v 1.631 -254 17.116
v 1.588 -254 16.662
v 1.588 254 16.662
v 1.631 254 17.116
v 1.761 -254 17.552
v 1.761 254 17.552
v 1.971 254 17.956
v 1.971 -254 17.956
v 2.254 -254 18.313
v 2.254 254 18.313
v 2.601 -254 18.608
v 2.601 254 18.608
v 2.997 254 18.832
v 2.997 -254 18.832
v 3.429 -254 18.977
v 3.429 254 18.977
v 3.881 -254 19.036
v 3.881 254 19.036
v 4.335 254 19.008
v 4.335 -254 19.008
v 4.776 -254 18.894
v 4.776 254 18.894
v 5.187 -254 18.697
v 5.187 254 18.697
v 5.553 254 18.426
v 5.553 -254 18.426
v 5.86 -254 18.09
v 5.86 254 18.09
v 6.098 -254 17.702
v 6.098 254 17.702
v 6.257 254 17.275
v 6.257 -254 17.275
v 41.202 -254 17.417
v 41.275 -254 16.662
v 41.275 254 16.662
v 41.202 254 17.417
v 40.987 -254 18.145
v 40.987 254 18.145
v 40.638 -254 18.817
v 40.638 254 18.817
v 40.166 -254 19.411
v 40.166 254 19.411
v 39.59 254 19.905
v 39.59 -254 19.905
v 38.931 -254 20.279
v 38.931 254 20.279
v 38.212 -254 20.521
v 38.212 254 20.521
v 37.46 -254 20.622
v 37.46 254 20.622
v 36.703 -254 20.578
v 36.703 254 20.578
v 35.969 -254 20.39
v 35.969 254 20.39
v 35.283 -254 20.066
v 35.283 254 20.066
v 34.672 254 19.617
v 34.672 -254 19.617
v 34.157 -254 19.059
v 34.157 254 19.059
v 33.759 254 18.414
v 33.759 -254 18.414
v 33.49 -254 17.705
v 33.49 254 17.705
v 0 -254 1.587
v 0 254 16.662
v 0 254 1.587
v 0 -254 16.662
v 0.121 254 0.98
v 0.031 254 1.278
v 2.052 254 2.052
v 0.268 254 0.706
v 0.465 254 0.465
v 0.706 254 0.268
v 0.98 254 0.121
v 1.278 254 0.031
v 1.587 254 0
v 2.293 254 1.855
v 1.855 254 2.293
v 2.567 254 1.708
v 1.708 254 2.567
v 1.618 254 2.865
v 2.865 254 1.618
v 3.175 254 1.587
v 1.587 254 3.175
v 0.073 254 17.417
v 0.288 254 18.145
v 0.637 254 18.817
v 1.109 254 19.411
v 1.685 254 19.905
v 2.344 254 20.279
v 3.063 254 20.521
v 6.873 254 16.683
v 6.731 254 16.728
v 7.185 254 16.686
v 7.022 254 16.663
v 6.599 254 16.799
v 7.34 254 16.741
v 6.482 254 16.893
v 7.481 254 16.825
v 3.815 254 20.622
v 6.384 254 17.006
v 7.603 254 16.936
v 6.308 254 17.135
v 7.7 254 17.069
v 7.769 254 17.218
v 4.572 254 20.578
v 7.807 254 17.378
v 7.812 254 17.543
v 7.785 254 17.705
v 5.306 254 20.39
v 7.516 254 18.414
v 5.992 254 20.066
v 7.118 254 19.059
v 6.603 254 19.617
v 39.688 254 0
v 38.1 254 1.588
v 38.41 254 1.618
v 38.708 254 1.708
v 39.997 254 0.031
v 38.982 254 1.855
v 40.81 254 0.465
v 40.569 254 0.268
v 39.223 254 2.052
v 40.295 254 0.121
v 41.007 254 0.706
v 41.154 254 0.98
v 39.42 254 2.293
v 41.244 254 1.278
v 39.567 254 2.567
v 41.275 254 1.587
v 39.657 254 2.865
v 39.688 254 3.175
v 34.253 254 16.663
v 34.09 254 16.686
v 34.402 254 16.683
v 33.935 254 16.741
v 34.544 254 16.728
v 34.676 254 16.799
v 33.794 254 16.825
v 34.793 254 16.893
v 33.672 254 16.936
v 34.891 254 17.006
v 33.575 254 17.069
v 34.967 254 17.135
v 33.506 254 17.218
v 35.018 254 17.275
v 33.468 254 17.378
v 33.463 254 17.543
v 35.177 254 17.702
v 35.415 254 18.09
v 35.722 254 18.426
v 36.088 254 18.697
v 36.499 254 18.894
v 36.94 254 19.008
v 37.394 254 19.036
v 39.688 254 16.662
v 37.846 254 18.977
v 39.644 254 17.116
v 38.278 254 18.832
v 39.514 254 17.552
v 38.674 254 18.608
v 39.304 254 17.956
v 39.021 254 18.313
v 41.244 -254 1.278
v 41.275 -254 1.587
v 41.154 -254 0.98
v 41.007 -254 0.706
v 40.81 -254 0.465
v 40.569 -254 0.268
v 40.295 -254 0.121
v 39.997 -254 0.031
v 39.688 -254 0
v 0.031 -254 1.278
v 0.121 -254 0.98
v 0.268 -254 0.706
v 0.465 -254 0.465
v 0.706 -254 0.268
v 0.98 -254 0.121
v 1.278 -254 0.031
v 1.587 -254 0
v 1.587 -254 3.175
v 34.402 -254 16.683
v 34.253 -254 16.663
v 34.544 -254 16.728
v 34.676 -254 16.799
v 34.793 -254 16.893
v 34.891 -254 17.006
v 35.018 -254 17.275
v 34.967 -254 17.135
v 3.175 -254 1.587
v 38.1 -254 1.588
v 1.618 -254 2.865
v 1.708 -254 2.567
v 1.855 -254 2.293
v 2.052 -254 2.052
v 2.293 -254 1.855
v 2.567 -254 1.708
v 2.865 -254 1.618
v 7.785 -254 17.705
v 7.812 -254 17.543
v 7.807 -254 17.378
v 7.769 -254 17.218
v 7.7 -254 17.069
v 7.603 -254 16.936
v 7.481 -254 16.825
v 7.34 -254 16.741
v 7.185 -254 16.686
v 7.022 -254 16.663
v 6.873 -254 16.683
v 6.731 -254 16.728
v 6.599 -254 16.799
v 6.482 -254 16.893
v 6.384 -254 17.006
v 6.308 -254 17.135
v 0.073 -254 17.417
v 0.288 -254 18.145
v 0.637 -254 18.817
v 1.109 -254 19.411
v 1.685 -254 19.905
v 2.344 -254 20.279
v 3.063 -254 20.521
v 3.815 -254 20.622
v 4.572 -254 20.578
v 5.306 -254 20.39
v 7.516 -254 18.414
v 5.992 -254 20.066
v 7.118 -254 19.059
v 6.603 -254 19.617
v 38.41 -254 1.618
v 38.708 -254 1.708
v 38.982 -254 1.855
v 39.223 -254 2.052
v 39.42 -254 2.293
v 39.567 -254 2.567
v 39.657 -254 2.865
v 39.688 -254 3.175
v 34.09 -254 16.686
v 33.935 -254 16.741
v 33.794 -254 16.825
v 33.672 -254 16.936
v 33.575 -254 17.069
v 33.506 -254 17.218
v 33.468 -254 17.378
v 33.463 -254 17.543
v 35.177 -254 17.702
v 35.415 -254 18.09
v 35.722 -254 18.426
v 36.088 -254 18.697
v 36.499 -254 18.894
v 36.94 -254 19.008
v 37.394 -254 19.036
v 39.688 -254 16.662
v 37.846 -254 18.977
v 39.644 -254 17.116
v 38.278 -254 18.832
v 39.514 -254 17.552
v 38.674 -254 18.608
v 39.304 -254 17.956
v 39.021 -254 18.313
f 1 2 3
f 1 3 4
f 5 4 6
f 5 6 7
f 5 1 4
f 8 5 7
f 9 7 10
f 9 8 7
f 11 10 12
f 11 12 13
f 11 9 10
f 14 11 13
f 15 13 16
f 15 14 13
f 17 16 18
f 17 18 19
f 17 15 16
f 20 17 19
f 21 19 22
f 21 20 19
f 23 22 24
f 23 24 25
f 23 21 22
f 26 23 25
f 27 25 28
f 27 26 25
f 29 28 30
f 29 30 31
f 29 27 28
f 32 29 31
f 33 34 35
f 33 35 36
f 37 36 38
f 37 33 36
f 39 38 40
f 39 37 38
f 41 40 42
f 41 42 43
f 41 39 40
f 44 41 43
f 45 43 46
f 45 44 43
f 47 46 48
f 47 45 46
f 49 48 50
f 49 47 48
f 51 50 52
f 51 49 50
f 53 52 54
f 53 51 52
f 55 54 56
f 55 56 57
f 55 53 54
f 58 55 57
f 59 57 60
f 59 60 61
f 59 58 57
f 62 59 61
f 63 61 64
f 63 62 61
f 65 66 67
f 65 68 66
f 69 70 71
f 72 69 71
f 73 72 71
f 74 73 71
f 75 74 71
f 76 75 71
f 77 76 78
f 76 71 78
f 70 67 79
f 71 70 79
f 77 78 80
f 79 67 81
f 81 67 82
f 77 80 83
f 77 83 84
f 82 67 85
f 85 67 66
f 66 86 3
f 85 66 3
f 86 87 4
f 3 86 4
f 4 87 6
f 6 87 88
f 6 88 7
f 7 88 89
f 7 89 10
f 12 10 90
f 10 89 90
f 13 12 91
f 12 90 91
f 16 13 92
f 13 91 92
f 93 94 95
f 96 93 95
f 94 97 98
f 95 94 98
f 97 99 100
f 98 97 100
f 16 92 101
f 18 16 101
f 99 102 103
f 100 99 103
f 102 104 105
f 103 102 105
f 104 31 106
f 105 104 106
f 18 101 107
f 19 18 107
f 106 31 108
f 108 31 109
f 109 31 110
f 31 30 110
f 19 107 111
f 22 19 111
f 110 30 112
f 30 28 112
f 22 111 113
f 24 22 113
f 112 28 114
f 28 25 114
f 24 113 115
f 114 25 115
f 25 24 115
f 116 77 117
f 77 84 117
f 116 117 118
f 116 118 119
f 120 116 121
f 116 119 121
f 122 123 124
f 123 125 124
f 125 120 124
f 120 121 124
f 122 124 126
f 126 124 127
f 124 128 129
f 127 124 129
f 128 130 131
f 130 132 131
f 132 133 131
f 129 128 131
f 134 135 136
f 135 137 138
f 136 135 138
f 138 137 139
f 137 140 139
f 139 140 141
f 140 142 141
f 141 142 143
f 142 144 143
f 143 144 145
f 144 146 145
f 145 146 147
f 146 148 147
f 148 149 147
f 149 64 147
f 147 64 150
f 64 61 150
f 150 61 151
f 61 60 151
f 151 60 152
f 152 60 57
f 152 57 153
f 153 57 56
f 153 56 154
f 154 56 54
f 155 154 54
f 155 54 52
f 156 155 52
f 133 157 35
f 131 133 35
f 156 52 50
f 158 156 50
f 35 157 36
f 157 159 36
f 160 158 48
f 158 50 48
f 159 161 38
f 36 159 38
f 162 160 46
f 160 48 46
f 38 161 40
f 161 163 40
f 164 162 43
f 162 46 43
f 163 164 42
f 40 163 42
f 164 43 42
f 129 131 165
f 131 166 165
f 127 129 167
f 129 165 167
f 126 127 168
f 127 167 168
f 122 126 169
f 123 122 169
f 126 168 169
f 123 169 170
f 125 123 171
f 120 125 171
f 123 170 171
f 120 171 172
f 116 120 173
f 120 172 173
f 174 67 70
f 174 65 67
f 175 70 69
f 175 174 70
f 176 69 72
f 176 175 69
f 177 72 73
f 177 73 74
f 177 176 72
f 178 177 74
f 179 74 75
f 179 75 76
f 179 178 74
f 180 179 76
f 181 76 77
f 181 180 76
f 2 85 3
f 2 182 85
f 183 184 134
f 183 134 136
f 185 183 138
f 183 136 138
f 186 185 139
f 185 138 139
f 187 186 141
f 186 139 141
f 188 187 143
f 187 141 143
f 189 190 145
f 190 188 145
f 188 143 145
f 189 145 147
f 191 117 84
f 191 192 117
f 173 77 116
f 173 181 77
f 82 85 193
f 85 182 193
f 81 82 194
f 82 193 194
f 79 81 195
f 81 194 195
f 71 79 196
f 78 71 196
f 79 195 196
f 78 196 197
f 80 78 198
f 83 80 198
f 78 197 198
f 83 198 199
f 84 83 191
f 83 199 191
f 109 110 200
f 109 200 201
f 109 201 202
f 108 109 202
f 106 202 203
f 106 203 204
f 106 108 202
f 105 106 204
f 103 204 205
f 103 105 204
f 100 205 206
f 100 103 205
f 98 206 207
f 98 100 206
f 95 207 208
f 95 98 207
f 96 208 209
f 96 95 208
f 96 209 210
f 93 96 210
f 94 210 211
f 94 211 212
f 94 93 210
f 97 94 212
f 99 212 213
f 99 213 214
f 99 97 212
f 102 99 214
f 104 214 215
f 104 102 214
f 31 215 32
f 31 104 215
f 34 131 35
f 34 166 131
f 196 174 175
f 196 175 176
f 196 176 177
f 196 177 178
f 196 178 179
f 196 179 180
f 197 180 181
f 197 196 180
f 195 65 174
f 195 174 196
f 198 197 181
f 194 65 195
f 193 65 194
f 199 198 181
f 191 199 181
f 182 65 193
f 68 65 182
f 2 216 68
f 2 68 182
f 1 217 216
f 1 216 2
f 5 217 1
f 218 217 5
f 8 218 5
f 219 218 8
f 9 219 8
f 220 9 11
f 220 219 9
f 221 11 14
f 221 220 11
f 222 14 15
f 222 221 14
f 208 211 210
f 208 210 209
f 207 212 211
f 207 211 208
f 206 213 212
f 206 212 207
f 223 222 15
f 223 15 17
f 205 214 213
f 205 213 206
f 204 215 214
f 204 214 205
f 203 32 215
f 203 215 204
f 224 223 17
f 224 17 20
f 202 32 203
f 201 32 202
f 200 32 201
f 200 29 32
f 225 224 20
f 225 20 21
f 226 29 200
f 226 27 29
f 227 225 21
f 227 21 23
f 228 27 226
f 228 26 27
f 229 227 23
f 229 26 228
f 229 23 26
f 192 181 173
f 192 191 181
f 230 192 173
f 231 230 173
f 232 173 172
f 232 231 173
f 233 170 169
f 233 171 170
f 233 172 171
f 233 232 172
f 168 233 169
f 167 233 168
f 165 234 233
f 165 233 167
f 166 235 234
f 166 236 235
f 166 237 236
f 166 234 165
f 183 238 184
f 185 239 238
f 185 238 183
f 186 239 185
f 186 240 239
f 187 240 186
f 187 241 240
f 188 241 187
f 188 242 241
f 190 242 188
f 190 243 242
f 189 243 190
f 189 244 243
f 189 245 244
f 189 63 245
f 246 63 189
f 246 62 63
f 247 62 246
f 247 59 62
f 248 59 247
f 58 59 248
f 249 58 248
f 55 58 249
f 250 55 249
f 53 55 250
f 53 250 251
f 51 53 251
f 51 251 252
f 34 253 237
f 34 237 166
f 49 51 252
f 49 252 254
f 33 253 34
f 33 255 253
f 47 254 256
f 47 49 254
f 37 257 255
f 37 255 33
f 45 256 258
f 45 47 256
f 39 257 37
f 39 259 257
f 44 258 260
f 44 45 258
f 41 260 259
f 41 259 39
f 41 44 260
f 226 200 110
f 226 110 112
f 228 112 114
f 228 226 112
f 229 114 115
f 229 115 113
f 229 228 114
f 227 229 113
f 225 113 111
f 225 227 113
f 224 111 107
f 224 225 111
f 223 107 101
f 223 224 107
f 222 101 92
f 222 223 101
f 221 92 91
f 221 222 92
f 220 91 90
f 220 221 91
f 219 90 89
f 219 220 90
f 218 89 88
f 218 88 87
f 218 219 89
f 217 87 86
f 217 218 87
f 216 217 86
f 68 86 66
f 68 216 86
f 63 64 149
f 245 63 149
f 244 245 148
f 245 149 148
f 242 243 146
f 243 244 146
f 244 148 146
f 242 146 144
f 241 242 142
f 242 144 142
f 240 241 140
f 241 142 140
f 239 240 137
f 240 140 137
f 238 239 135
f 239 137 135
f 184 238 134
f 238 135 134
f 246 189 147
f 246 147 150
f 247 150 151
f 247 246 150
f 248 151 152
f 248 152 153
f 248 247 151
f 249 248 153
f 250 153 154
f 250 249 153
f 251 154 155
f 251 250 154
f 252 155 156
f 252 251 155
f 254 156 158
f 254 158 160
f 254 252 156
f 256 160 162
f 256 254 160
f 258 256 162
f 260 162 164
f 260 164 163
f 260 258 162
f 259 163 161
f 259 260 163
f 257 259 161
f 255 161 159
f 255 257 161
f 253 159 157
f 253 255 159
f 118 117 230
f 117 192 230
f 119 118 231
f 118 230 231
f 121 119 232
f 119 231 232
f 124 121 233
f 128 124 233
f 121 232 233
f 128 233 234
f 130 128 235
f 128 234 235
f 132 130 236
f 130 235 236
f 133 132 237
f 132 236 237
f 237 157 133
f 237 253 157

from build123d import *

# Parameters (mm, degrees)
F1_DEPTH    = 254
F2_R        = 1.5875
F3_T1_DEPTH = 511.5860222341
F3_T3_DEPTH = 513.2602424874


# Not quite as in the source:
# - a fillet or chamfer that OpenCascade refuses, or shapes differently, is made with other operations: its cross-section is extruded or revolved along the edge and cut away or added


with BuildPart() as f1:
    # F0 (on Front) → F1 (new body, symmetric)
    with BuildSketch(Plane.XZ):
        with BuildLine():
            Line((0, 16.6624), (0, 0))
            Line((0, 0), (41.275, 0))
            Line((41.275, 0), (41.275, 16.6624))
            ThreePointArc((41.275, 16.6624), (37.3126, 20.6248), (33.3502, 16.6624))
            Line((33.3502, 16.6624), (34.9377, 16.6624))
            ThreePointArc((34.9377, 16.6624), (37.3126, 19.0373), (39.6875, 16.6624))
            Line((39.6875, 16.6624), (39.6875, 1.5875))
            Line((39.6875, 1.5875), (1.5875, 1.5875))
            Line((1.5875, 1.5875), (1.5875, 16.6624))
            Line((1.5875, 16.6624), (0, 16.6624))
        make_face()
        with BuildLine():
            ThreePointArc((7.9248, 16.6624), (3.9624, 20.6248), (0, 16.6624))
            Line((0, 16.6624), (1.5875, 16.6624))
            ThreePointArc((1.5875, 16.6624), (3.9624, 19.0373), (6.3373, 16.6624))
            Line((6.3373, 16.6624), (7.9248, 16.6624))
        make_face()
    extrude(amount=F1_DEPTH, both=True)

    # F2
    f2_edges = [f1.edges().sort_by_distance(p)[0] for p in [
        (0, 0, 0),
        (41.275, 0, 0),
        (39.6875, 0, 1.5875),
        (1.5875, 0, 1.5875),
    ]]
    fillet(f2_edges, radius=F2_R)

    # F3: fillet of radius 0.8255 on 4 edges, made by hand

    # F3_s2 → F3_t1 (cut)
    with BuildSketch(Plane.XZ.offset(-255.793011117)):
        with BuildLine():
            ThreePointArc((34.2204955532, 16.6624), (34.723327211, 16.8332164322), (35.0180621764, 17.2749734127))
            ThreePointArc((35.0180621764, 17.2749734127), (34.957876249, 16.9713110978), (34.9377, 16.6624))
            Line((34.9377, 16.6624), (34.2204955532, 16.6624))
        make_face()
        with BuildLine():
            ThreePointArc((7.0545044468, 16.6624), (6.551672789, 16.8332164322), (6.2569378236, 17.2749734127))
            ThreePointArc((6.2569378236, 17.2749734127), (6.317123751, 16.9713110978), (6.3373, 16.6624))
            Line((6.3373, 16.6624), (7.0545044468, 16.6624))
        make_face()
    extrude(amount=F3_T1_DEPTH, mode=Mode.SUBTRACT)

    # F3_s4 → F3_t3 (cut)
    with BuildSketch(Plane.XZ.offset(-256.6301212437)):
        with BuildLine():
            ThreePointArc((33.4898635929, 17.7051368421), (33.6302261346, 16.9868405041), (34.2862670111, 16.6624))
            Line((34.2862670111, 16.6624), (33.3502, 16.6624))
            ThreePointArc((33.3502, 16.6624), (33.385271105, 17.1884242487), (33.4898635929, 17.7051368421))
        make_face()
        with BuildLine():
            ThreePointArc((7.7851364071, 17.7051368421), (7.6447738654, 16.9868405041), (6.9887329889, 16.6624))
            Line((6.9887329889, 16.6624), (7.9248, 16.6624))
            ThreePointArc((7.9248, 16.6624), (7.889728895, 17.1884242487), (7.7851364071, 17.7051368421))
        make_face()
    extrude(amount=F3_T3_DEPTH, mode=Mode.SUBTRACT)


solid = f1.part
